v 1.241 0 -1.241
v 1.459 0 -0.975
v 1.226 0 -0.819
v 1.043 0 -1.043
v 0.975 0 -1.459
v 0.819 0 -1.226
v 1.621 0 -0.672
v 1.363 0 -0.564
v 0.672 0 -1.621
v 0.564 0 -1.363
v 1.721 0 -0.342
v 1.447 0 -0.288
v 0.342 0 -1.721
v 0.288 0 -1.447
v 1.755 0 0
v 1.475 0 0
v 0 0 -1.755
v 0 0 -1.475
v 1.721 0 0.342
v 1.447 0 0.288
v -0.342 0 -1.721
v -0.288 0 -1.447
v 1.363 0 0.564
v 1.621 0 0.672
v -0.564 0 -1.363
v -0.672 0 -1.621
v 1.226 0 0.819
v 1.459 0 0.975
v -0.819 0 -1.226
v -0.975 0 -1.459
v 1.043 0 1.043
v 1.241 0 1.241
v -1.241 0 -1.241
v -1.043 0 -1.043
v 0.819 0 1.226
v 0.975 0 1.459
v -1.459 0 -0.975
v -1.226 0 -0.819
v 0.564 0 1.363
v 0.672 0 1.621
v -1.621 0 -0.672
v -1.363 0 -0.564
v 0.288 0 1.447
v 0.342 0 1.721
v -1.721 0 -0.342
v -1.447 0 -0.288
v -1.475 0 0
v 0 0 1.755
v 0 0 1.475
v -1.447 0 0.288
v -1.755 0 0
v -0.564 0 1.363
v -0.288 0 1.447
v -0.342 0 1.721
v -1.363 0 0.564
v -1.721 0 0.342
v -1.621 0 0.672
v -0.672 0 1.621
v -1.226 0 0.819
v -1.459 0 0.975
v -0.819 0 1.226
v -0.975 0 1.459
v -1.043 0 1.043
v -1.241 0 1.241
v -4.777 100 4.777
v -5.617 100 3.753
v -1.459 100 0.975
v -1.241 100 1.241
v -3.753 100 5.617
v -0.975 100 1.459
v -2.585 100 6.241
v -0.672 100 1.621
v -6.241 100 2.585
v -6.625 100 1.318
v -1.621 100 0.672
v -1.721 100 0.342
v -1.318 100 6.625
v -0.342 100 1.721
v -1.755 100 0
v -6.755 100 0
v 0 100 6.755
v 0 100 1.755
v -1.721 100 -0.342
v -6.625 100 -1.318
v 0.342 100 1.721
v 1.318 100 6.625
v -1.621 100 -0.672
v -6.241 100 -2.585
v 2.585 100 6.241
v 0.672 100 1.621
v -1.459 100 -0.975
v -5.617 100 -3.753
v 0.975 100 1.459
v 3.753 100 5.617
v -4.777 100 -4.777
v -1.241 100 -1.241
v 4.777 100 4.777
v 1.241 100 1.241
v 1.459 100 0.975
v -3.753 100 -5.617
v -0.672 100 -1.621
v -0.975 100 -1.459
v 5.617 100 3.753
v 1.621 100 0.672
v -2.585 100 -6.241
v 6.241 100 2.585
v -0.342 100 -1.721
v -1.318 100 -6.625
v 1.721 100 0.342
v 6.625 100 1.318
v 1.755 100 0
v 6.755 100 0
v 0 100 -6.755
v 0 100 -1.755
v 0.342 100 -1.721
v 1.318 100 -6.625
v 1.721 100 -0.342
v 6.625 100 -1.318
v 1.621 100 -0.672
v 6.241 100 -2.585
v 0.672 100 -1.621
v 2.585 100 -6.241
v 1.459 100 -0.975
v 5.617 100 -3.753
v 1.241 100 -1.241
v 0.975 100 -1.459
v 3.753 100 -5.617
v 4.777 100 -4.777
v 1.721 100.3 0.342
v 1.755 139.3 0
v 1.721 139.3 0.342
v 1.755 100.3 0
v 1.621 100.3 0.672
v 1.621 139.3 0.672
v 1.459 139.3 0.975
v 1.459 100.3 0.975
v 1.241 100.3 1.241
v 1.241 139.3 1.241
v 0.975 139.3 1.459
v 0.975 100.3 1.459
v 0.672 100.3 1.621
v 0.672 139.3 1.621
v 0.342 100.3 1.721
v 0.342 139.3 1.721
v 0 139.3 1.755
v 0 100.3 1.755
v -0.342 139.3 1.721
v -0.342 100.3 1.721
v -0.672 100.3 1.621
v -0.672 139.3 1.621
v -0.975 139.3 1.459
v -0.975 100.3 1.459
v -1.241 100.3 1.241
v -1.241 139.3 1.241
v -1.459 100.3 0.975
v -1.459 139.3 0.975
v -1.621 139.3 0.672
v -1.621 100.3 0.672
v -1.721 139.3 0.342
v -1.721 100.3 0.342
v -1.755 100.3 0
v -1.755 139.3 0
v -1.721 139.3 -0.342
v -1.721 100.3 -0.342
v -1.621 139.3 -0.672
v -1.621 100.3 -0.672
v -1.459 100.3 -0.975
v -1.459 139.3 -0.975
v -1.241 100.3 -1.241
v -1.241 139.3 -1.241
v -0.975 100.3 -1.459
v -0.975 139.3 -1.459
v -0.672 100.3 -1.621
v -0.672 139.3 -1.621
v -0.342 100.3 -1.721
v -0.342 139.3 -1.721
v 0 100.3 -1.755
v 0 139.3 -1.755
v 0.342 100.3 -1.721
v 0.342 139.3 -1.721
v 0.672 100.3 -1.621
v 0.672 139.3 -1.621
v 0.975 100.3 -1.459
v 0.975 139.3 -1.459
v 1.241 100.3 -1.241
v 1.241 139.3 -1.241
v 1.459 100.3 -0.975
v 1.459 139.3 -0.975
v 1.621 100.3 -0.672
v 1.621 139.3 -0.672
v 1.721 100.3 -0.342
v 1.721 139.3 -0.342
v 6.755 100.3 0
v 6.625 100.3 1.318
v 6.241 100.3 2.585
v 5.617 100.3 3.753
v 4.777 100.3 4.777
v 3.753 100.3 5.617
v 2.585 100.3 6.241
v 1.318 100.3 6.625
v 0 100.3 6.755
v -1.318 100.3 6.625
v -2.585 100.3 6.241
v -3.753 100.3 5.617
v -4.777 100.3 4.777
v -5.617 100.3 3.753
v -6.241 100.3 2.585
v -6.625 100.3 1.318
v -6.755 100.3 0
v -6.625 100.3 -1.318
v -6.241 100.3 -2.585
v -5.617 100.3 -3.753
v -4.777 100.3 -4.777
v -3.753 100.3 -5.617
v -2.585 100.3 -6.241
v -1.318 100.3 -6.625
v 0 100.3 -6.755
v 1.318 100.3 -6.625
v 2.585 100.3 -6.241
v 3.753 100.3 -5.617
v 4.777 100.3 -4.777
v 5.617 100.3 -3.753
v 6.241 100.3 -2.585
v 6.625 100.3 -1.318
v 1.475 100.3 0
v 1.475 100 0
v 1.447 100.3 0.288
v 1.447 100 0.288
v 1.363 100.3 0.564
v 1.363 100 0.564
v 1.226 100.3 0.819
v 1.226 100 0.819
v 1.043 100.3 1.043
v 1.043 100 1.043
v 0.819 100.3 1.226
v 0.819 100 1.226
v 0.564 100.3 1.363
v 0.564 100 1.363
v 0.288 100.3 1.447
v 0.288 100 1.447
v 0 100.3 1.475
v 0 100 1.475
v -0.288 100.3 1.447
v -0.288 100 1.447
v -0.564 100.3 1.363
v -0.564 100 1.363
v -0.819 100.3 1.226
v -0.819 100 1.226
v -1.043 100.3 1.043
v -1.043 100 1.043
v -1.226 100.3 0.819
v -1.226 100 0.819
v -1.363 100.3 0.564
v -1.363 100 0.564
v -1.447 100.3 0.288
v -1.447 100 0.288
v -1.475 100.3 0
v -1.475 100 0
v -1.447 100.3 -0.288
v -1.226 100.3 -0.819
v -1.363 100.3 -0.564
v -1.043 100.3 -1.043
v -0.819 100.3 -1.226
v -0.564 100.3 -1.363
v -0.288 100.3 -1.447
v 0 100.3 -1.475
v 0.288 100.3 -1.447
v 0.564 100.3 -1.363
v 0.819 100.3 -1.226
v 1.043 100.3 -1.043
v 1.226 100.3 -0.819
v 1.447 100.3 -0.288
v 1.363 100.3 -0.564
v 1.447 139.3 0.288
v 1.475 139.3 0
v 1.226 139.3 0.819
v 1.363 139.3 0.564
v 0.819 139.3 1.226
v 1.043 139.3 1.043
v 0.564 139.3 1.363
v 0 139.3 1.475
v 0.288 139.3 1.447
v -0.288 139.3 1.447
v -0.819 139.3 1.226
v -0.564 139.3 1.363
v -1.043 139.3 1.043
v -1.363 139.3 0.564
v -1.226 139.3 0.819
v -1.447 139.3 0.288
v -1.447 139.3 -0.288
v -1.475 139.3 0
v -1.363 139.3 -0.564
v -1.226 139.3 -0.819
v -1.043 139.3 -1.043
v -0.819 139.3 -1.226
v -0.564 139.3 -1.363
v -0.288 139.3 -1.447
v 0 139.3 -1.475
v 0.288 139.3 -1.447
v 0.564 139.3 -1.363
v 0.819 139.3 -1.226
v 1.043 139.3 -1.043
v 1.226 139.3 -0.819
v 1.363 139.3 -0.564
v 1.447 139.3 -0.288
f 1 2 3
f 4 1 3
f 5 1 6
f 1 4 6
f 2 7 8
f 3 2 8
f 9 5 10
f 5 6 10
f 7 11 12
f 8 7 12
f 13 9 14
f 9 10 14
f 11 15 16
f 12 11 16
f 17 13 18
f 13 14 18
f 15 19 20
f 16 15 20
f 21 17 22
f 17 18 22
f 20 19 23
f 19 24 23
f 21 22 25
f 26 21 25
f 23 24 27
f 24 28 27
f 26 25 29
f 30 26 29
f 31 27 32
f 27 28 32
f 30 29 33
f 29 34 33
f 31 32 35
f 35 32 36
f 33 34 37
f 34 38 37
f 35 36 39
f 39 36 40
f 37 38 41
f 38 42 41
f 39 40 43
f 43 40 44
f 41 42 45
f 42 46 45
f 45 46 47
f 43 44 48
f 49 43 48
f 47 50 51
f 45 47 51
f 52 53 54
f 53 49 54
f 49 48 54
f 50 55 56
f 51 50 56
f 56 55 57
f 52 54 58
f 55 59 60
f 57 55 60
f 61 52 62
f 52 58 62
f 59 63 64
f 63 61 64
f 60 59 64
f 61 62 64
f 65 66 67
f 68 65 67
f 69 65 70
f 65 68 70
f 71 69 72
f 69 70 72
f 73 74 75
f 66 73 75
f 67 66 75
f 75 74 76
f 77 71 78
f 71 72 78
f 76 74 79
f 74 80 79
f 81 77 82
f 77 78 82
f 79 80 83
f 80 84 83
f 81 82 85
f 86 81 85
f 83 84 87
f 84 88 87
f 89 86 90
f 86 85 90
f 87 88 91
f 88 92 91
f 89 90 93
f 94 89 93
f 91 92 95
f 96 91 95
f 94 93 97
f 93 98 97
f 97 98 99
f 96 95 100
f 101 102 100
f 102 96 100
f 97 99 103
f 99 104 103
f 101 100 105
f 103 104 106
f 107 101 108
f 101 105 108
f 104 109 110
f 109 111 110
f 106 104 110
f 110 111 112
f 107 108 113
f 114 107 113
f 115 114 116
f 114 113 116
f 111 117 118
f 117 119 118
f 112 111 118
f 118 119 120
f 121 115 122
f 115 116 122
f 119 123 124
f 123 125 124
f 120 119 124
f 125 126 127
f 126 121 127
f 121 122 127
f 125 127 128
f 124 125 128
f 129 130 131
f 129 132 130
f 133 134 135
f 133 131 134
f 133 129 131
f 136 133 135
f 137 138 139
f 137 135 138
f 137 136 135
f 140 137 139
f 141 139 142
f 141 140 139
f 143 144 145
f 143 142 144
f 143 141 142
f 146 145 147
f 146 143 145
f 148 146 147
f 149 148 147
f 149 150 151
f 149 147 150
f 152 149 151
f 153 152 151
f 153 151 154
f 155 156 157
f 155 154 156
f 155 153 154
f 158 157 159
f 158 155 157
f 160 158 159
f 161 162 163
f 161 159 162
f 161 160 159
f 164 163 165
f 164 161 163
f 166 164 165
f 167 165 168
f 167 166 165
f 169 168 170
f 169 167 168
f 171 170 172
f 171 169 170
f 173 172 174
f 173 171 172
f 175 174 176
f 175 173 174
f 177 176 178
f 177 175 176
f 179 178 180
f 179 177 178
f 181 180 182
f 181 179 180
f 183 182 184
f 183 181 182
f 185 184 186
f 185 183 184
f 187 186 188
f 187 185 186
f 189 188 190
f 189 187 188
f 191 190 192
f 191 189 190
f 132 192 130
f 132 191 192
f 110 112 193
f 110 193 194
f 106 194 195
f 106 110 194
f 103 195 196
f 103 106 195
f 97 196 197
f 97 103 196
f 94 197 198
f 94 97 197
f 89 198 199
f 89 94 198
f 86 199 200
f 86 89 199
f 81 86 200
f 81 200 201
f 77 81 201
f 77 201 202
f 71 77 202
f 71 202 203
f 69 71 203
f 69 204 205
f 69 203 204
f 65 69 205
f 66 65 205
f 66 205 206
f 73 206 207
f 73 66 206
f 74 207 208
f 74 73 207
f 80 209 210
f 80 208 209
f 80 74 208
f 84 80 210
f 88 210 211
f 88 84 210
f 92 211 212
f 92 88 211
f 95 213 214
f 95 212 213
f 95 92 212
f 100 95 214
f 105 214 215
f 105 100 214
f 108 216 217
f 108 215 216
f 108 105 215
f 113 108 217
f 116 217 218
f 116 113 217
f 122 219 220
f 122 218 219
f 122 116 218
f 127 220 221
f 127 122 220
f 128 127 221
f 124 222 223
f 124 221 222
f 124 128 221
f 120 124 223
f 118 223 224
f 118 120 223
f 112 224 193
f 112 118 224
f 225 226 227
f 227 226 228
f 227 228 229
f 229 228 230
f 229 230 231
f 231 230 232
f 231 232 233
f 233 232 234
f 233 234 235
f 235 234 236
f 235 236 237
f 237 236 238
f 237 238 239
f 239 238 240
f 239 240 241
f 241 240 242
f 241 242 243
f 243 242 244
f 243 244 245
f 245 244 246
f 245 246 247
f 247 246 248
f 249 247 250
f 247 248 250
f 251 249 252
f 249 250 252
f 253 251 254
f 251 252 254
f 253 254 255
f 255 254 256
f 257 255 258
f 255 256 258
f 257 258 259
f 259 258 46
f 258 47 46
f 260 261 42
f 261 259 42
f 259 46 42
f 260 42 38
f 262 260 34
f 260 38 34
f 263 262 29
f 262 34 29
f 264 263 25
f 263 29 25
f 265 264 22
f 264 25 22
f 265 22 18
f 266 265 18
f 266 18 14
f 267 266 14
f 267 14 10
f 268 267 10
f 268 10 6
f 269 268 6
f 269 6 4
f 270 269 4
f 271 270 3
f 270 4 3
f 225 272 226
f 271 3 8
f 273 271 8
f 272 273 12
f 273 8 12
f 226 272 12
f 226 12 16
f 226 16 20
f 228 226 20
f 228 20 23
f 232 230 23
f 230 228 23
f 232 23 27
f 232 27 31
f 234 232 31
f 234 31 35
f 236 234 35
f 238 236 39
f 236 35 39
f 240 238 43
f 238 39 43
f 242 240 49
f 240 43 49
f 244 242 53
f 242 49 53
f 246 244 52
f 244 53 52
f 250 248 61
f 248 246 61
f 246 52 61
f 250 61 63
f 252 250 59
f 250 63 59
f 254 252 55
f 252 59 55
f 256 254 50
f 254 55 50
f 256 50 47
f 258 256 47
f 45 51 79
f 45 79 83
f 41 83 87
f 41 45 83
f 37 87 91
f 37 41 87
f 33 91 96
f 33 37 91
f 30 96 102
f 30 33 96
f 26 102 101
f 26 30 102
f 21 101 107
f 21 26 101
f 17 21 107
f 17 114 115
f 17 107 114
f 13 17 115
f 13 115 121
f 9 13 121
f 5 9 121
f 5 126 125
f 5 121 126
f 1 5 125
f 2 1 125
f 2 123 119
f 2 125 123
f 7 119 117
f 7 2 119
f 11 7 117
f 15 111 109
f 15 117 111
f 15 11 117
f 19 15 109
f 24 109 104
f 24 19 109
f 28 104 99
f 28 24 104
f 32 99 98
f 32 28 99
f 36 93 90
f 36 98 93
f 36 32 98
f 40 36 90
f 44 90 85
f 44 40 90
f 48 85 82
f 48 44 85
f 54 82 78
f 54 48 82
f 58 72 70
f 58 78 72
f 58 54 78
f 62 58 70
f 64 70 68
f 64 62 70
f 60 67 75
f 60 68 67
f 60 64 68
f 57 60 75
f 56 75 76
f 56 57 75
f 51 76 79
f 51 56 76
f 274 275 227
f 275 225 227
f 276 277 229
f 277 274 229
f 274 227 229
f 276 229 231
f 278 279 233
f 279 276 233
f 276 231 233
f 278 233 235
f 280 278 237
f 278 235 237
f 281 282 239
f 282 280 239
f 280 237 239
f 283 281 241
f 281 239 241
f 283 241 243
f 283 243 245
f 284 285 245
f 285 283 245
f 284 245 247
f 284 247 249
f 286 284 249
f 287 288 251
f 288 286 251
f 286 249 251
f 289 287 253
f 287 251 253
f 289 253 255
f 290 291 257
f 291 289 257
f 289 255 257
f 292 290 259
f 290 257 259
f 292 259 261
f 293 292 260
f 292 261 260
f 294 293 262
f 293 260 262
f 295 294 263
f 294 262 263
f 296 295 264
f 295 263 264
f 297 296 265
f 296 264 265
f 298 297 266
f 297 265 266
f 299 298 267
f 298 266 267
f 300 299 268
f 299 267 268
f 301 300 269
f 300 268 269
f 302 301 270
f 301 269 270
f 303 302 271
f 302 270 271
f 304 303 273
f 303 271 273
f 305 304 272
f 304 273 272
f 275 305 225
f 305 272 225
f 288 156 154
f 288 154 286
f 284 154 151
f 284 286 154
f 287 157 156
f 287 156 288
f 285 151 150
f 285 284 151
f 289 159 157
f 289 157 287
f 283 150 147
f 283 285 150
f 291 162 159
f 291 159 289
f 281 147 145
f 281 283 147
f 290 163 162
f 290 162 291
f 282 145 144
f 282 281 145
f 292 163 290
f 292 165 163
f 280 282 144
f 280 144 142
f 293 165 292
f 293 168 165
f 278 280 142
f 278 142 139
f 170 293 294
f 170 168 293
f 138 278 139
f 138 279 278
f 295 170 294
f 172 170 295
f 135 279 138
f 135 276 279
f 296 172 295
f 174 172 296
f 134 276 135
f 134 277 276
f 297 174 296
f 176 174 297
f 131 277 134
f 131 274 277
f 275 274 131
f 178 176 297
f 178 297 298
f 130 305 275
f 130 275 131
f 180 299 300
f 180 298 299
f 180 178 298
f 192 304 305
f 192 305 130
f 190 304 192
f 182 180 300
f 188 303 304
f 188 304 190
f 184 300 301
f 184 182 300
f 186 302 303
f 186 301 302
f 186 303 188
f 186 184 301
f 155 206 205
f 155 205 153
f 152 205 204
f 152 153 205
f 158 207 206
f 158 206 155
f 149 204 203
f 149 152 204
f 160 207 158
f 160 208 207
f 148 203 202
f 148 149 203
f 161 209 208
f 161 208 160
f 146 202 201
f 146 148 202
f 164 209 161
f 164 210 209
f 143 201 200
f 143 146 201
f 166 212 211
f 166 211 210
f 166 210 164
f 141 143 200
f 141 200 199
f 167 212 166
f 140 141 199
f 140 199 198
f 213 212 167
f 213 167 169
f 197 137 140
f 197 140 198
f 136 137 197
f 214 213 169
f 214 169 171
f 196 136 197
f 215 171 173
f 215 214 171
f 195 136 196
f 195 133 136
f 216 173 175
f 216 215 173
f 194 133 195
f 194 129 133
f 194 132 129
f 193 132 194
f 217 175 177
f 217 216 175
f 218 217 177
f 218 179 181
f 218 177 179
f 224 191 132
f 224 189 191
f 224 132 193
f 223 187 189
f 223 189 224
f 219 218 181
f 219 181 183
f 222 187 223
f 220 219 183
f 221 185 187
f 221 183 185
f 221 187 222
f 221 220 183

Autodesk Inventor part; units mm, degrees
ref_plane "YZ Plane" through (0, 0, 0) normal (1, 0, 0) x (0, 1, 0)
ref_plane "XZ Plane" through (0, 0, 0) normal (0, 1, 0) x (-1, 0, 0)
ref_plane "XY Plane" through (0, 0, 0) normal (0, 0, 1) x (1, 0, 0)
sketch "Sketch1" plane through (0, 0, 0) normal (0, 1, 0) x (-1, 0, 0)
  circle A0 centre (0, 0) radius 1.755
  circle A1 centre (0, 0) radius 1.475
  dimension "d0" = 3.51
  dimension "d1" = 2.95
extrude "Extrusion1" add sketch "Sketch1" along normal blind 100
sketch "Sketch2" plane through (0, 100, 0) normal (0, 1, 0) x (1, 0, 0)
  circle A0 centre (0, 0) radius 1.755 projected
  circle A1 centre (0, 0) radius 1.475 projected
  circle A2 centre (0, 0) radius 6.755
  dimension "d4" = 5
extrude "Extrusion2" add sketch "Sketch2" along normal blind 0.3 contours A0 | A2
sketch "Sketch3" plane through (0, 100.3, 0) normal (0, 1, 0) x (1, 0, 0)
  circle A0 centre (0, 0) radius 1.755 projected
  circle A1 centre (0, 0) radius 1.475 projected
extrude "Extrusion3" add sketch "Sketch3" along normal blind 39
properties part number "Shield"
